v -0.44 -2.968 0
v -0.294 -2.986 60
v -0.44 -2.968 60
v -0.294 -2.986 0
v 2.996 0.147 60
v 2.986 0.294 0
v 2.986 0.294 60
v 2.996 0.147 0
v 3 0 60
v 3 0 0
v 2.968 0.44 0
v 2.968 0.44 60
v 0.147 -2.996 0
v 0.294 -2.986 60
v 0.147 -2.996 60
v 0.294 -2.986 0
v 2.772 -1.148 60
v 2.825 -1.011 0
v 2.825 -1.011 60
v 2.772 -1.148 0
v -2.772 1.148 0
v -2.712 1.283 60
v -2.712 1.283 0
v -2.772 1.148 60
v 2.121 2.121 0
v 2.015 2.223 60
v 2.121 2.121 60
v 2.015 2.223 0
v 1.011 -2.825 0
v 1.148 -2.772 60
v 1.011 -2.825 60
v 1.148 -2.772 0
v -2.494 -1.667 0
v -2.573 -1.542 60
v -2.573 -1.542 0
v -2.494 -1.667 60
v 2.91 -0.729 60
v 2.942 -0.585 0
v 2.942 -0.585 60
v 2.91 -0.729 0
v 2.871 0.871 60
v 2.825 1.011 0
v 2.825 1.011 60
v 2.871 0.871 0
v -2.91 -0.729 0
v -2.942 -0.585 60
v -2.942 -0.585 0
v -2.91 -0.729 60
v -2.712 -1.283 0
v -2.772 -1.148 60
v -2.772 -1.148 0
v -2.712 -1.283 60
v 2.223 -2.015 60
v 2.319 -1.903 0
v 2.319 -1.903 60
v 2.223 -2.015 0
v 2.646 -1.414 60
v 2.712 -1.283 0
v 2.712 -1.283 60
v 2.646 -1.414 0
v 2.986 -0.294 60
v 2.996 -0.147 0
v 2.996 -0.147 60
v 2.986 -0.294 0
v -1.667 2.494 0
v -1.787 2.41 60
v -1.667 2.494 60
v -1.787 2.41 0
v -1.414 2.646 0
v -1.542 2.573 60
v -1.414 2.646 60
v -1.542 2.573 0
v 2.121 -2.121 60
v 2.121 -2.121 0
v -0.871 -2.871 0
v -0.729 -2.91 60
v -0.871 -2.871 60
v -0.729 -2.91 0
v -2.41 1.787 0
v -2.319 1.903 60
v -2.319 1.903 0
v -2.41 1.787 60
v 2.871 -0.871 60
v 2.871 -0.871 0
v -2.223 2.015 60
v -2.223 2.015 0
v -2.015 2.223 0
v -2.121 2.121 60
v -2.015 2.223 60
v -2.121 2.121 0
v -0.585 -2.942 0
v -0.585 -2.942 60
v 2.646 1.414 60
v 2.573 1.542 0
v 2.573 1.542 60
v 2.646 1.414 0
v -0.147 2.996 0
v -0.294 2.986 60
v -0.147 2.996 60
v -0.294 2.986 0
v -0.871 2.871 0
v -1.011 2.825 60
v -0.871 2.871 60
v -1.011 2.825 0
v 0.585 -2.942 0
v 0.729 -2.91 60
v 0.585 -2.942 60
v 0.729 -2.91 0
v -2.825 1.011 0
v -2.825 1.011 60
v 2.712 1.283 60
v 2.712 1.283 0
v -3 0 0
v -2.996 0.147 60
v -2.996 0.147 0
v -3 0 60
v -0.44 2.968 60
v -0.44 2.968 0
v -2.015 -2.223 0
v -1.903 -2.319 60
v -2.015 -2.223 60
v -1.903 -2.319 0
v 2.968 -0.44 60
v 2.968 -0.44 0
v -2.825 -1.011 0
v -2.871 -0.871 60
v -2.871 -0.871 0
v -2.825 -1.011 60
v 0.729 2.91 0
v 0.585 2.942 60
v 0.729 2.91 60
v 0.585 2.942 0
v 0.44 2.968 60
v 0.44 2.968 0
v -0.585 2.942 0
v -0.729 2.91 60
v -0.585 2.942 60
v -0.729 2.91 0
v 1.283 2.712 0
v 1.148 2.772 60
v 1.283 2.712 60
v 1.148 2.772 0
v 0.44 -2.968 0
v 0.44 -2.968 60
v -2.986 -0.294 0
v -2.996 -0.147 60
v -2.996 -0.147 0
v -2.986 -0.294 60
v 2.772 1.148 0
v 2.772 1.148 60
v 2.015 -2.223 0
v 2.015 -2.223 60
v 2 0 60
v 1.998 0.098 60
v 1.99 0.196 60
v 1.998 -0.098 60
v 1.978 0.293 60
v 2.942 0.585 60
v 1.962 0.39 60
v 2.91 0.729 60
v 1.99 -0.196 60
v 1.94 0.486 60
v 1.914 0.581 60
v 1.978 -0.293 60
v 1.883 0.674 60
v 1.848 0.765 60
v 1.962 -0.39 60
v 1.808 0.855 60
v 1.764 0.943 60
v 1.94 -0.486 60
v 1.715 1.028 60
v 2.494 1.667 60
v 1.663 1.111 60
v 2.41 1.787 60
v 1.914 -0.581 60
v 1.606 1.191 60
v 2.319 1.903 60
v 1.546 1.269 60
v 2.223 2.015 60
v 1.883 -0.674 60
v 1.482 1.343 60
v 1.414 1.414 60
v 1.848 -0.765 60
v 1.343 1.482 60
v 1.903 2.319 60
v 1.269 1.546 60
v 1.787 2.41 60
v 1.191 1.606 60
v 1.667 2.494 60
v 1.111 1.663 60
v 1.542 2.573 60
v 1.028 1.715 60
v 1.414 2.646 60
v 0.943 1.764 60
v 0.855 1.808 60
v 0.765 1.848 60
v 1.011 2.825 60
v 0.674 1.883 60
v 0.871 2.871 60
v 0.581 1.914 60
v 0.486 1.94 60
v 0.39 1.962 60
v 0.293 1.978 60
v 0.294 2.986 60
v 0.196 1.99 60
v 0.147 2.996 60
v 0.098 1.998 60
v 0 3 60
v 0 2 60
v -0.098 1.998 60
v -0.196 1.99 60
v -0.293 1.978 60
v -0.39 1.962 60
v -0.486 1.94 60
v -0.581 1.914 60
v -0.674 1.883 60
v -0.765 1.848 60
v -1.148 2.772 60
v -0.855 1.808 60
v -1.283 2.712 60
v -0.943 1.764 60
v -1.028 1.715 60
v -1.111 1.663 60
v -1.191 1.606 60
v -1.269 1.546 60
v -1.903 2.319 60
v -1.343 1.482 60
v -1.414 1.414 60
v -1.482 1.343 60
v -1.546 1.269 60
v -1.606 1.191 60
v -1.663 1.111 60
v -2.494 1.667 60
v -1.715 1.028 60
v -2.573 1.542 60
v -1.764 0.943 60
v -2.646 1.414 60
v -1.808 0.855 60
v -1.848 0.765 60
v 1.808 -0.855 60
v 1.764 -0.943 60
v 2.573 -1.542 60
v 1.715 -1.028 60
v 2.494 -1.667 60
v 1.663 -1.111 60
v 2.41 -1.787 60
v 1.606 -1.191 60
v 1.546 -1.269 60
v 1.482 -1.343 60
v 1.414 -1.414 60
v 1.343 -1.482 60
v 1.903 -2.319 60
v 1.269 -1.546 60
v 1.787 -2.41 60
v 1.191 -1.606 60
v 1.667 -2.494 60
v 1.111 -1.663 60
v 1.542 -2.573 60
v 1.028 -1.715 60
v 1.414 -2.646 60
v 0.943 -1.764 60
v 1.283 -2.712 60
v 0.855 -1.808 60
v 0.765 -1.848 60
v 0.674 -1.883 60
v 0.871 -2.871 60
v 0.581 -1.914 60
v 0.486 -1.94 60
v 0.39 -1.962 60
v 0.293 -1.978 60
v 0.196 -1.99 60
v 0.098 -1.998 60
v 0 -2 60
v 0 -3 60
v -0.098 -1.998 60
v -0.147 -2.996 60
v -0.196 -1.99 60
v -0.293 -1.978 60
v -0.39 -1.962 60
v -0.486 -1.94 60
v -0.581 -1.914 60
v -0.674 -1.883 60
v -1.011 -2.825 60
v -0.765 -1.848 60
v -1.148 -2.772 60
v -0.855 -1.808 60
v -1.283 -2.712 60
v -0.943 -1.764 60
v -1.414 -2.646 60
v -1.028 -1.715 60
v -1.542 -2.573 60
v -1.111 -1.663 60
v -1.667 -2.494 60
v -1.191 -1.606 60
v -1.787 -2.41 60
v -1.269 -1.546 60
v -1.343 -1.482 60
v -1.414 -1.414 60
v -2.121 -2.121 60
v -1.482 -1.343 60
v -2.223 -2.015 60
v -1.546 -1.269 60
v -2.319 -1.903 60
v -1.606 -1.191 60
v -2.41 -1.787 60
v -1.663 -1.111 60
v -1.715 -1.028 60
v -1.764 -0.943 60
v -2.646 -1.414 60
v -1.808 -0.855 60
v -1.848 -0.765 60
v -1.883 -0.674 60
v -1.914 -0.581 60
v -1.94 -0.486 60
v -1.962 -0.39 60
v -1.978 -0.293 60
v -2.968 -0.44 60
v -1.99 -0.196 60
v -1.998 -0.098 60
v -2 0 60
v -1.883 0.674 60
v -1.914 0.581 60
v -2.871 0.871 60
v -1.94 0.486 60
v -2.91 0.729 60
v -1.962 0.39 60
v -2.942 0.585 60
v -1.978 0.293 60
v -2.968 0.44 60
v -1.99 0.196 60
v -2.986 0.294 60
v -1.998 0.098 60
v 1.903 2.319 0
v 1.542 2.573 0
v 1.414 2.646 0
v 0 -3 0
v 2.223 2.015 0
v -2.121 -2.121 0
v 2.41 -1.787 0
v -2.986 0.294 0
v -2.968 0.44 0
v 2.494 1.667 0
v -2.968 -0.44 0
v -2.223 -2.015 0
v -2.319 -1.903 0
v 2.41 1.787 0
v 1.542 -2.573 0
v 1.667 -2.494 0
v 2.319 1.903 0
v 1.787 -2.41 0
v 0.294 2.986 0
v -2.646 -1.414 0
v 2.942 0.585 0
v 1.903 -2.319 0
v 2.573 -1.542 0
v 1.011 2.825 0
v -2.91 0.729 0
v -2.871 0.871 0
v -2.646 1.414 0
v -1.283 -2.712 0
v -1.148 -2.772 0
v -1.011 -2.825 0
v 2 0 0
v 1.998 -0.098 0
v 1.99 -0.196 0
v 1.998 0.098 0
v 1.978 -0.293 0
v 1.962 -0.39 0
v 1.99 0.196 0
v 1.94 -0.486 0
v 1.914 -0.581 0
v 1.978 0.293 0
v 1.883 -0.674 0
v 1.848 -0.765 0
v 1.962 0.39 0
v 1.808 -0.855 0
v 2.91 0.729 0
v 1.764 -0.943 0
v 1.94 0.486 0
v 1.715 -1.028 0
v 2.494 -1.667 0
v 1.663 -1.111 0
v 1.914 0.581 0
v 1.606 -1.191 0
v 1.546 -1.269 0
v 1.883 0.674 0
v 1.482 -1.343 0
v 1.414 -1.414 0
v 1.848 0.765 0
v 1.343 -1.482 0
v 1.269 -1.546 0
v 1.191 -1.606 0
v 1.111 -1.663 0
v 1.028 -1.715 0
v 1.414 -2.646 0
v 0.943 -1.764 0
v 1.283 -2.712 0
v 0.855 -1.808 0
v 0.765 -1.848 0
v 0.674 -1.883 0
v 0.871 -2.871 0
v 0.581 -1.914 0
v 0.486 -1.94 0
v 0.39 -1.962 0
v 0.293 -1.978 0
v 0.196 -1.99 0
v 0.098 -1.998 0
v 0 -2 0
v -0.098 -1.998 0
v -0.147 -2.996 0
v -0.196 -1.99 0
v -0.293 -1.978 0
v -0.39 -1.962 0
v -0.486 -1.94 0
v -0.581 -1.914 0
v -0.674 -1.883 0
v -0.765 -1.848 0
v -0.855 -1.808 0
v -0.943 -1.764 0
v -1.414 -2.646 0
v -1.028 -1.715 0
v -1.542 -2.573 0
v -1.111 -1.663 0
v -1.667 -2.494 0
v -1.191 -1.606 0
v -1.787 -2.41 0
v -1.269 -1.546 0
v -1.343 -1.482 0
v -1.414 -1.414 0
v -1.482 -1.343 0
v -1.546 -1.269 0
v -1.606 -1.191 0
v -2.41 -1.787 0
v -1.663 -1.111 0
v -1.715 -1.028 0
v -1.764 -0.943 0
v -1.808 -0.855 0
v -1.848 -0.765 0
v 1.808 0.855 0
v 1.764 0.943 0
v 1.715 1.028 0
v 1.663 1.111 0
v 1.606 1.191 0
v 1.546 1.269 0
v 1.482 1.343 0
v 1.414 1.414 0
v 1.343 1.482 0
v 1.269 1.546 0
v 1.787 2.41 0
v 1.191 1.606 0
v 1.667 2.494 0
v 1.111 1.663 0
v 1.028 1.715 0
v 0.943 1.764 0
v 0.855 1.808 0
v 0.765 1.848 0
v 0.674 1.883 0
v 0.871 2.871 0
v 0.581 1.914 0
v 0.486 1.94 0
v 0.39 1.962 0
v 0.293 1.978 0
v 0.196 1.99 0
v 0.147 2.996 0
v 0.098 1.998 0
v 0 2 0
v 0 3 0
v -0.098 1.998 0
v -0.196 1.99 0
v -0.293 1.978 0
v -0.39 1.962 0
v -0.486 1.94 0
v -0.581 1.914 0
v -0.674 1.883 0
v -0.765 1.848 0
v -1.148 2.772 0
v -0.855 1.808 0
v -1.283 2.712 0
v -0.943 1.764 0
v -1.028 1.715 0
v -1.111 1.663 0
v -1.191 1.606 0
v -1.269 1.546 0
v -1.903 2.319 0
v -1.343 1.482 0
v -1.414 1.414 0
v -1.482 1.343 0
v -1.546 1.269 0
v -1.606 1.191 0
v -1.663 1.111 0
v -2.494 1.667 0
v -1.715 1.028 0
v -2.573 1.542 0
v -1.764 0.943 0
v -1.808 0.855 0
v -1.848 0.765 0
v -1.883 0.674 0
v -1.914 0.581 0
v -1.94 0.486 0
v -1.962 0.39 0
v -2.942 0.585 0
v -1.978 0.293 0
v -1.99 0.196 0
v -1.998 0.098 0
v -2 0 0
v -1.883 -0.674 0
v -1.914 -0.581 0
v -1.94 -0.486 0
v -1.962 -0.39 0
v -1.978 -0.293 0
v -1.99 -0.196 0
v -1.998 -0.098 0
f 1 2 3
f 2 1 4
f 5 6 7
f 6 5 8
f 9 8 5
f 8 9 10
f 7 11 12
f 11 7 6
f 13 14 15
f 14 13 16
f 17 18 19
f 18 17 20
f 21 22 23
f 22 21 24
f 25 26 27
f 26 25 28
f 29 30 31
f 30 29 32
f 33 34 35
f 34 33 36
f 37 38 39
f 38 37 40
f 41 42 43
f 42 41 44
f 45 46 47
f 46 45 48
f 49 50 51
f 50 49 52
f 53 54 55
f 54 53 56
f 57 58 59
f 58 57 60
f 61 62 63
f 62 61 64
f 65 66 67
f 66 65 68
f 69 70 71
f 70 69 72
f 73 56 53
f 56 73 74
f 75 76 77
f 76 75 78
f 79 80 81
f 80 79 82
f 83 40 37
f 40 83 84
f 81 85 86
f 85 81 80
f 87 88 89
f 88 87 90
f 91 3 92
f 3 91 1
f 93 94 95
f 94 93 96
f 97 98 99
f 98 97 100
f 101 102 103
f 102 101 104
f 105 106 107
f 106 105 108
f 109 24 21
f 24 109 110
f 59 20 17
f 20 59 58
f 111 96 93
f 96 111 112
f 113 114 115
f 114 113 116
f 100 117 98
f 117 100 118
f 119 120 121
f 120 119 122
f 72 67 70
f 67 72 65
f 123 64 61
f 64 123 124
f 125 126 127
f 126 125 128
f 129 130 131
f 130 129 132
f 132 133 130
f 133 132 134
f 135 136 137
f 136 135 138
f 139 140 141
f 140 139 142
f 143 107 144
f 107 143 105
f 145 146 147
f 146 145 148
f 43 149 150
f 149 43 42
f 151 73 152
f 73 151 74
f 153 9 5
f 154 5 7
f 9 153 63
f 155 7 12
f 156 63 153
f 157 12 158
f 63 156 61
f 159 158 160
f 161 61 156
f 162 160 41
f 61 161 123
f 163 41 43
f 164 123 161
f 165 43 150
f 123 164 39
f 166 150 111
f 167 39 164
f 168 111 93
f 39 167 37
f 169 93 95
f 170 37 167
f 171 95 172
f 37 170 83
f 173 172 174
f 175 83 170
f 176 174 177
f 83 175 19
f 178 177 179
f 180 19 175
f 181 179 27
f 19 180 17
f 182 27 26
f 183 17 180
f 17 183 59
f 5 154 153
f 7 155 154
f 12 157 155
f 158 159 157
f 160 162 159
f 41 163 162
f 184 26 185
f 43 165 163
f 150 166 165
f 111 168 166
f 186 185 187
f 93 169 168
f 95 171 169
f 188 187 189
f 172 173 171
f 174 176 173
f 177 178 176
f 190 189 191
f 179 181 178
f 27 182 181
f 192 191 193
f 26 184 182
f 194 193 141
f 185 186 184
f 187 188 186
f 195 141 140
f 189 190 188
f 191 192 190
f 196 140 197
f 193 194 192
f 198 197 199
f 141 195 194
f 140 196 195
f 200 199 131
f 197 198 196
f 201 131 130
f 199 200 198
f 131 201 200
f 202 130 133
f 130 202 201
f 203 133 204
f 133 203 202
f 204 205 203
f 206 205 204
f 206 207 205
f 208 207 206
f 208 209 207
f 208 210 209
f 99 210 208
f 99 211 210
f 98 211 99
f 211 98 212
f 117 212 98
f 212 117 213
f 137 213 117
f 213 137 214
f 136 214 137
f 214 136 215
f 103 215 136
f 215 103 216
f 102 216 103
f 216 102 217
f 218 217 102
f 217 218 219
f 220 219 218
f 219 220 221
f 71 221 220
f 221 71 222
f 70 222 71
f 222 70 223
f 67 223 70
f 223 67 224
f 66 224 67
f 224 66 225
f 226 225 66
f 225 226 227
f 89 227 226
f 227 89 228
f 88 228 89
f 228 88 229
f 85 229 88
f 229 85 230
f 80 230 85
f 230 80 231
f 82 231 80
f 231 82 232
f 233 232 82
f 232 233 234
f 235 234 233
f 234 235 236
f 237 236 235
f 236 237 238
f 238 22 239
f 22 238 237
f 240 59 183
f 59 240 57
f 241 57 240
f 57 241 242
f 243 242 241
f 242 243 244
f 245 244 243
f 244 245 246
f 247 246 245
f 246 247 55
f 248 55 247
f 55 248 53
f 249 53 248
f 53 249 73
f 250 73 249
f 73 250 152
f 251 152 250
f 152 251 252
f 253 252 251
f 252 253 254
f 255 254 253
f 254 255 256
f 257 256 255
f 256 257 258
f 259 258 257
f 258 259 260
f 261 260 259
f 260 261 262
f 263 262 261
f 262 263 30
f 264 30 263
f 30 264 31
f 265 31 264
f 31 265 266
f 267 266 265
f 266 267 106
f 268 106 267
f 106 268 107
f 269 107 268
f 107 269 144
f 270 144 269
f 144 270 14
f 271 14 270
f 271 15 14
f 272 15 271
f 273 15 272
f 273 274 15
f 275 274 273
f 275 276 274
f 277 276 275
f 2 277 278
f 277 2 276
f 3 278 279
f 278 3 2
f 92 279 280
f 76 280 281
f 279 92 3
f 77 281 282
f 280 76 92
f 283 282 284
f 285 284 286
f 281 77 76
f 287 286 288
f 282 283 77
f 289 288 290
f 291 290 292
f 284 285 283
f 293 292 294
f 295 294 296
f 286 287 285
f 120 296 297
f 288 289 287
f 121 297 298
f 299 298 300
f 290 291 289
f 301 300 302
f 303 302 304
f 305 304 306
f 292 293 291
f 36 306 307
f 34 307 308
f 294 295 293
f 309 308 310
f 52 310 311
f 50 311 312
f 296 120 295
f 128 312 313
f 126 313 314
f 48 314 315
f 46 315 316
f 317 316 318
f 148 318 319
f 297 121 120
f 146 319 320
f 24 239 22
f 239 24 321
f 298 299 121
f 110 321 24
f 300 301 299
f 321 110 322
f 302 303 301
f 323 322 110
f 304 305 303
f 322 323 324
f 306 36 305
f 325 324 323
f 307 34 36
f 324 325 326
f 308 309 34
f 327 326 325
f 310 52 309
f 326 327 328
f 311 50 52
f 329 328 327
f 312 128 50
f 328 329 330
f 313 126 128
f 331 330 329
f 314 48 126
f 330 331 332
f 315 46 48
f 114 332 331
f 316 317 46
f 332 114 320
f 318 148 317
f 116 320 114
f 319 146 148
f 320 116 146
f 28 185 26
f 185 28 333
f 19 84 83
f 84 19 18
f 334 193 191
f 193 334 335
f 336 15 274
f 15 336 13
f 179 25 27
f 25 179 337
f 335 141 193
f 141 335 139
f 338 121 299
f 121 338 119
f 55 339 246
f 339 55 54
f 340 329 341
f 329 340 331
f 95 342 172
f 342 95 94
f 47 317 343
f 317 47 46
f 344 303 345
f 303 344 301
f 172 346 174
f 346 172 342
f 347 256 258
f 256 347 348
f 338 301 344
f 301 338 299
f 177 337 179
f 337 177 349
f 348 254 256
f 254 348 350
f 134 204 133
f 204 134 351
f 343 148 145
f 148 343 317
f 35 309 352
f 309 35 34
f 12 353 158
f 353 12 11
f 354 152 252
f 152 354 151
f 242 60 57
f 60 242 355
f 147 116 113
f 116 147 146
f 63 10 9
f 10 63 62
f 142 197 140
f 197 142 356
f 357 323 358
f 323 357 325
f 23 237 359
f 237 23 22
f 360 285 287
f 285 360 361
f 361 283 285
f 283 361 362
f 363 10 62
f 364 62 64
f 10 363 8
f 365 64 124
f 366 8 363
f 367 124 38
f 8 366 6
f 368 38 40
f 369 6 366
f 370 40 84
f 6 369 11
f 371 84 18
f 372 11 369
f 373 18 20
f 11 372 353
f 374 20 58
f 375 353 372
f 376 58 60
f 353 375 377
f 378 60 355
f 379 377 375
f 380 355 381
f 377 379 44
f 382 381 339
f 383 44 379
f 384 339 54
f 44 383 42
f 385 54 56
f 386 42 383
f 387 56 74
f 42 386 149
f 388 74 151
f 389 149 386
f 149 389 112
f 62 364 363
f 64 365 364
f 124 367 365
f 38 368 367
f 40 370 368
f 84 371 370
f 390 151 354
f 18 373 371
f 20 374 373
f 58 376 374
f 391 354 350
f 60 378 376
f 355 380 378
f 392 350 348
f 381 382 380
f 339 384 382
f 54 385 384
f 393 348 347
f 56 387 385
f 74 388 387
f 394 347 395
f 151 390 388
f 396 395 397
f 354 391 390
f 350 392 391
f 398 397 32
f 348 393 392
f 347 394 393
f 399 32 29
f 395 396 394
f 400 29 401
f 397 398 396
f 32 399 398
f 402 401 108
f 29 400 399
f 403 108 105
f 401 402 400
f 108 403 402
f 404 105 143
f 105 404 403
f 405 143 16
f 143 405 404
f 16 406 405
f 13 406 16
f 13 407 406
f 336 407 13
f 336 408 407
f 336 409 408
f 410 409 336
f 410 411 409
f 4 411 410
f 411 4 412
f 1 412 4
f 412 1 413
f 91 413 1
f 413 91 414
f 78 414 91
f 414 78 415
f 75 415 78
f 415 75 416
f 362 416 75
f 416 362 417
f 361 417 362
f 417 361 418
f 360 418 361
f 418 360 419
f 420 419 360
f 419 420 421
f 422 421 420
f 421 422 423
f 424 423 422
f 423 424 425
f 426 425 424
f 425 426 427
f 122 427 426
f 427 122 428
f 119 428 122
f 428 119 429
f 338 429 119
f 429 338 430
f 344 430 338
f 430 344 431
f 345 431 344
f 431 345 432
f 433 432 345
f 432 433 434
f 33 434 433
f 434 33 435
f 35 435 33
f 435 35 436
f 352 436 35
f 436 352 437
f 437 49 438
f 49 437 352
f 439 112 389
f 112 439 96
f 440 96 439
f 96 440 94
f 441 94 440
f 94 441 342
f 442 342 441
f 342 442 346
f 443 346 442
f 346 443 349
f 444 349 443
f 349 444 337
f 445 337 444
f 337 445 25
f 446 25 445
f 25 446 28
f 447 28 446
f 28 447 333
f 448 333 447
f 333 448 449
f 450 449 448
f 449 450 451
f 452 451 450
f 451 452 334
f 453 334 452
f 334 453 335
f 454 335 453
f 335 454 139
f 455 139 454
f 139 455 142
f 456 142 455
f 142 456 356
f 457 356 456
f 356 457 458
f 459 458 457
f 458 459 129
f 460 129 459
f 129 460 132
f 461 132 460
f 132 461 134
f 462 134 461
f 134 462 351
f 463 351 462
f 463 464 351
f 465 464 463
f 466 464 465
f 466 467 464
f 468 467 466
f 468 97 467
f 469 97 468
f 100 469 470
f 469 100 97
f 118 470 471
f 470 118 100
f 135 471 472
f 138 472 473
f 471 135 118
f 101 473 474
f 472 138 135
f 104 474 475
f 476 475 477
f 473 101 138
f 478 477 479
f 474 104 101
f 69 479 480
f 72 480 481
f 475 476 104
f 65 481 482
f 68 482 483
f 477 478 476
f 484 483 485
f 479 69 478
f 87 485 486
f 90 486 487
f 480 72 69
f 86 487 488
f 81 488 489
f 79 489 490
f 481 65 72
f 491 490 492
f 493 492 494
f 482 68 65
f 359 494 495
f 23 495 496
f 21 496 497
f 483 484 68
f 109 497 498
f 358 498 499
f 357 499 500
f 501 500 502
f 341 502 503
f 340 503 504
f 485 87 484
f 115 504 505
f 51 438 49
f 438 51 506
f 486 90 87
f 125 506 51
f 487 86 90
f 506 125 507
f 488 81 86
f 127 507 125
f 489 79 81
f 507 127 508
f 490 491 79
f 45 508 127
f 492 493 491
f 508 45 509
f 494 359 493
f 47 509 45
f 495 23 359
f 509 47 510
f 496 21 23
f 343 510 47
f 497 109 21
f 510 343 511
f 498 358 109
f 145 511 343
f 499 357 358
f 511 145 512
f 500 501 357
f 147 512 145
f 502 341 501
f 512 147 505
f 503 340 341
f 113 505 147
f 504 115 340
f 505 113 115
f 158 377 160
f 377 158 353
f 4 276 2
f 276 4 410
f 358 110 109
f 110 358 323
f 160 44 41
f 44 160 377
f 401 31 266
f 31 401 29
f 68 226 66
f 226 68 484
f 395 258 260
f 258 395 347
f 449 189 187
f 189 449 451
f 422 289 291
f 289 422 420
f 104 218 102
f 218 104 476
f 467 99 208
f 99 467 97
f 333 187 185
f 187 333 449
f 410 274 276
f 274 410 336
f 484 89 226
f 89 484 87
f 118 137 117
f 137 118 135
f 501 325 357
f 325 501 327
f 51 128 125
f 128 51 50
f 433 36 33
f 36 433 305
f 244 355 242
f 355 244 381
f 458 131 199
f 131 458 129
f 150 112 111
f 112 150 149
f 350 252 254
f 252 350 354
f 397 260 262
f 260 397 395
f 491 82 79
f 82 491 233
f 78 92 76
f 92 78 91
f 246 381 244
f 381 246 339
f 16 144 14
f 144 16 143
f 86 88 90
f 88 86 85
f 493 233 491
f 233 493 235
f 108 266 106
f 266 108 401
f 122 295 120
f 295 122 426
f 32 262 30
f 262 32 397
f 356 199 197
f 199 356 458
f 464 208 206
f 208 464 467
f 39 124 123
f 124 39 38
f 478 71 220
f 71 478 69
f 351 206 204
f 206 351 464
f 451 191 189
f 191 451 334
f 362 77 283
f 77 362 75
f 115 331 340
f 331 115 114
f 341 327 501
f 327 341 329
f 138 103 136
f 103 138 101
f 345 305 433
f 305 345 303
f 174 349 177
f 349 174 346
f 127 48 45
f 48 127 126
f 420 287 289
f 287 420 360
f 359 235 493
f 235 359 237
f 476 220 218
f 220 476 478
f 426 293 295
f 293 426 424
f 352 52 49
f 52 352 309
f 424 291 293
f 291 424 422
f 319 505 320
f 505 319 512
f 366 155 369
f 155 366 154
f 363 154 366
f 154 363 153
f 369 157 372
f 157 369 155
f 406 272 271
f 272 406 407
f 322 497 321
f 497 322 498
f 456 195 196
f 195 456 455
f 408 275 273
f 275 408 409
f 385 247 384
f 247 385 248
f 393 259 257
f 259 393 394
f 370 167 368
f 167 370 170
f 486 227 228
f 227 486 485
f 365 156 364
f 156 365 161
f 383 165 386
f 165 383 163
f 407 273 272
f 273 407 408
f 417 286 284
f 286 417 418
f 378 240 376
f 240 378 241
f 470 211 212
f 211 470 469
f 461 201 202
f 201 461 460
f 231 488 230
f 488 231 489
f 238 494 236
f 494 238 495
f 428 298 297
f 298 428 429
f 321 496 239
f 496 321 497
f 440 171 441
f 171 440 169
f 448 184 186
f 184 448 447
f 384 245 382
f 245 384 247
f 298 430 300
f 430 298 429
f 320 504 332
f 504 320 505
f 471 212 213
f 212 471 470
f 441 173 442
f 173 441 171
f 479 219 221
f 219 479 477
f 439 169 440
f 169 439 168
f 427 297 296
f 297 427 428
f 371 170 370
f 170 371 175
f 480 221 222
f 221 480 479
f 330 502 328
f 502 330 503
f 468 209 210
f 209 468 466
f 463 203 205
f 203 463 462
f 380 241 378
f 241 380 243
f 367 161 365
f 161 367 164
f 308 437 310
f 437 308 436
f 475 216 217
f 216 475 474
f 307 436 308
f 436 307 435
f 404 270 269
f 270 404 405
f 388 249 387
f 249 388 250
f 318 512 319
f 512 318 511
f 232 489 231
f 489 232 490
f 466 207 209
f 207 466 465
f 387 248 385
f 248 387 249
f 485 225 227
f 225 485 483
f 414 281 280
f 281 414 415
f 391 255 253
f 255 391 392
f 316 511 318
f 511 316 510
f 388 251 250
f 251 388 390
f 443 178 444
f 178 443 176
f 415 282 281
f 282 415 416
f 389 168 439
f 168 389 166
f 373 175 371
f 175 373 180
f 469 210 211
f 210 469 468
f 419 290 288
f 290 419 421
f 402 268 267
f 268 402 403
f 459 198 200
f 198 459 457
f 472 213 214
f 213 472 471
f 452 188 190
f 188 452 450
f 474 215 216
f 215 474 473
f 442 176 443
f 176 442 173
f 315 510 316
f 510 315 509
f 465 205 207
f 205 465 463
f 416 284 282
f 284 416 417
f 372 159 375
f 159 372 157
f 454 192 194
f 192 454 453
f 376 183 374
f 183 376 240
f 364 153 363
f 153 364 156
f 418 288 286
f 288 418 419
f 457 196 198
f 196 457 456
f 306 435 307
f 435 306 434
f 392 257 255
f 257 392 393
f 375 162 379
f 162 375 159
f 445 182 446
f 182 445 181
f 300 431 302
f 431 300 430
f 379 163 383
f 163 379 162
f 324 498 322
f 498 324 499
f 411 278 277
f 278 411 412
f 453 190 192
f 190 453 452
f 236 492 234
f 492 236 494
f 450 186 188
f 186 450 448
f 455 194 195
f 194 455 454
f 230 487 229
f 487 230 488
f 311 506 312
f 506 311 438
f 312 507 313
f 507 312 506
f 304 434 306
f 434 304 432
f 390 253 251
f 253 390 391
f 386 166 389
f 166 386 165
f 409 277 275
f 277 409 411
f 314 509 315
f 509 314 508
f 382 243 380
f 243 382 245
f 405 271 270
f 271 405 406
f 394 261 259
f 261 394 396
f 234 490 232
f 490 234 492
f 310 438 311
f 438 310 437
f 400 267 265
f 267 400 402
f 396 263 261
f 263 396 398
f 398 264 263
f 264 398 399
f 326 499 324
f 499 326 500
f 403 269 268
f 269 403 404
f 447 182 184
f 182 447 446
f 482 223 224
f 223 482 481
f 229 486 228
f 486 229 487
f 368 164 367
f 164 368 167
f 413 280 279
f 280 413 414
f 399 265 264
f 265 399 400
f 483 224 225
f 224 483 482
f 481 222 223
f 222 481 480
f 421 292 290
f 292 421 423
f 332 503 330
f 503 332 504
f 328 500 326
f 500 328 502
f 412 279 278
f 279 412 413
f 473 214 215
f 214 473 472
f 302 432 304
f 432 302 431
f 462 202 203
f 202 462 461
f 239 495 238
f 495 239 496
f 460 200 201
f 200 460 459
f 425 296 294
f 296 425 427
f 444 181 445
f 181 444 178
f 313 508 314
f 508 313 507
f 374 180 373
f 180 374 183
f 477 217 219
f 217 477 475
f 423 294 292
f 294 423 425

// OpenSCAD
$fn = 128;

// PTFE sleeving (simple hollow tube)
inner_d = 4;      // mm
outer_d = 6;      // mm
length  = 60;     // mm

module ptfe_sleeving(id, od, h) {
    difference() {
        cylinder(d=od, h=h, center=false);
        translate([0,0,-0.1]) cylinder(d=id, h=h+0.2, center=false);
    }
}

ptfe_sleeving(inner_d, outer_d, length);
